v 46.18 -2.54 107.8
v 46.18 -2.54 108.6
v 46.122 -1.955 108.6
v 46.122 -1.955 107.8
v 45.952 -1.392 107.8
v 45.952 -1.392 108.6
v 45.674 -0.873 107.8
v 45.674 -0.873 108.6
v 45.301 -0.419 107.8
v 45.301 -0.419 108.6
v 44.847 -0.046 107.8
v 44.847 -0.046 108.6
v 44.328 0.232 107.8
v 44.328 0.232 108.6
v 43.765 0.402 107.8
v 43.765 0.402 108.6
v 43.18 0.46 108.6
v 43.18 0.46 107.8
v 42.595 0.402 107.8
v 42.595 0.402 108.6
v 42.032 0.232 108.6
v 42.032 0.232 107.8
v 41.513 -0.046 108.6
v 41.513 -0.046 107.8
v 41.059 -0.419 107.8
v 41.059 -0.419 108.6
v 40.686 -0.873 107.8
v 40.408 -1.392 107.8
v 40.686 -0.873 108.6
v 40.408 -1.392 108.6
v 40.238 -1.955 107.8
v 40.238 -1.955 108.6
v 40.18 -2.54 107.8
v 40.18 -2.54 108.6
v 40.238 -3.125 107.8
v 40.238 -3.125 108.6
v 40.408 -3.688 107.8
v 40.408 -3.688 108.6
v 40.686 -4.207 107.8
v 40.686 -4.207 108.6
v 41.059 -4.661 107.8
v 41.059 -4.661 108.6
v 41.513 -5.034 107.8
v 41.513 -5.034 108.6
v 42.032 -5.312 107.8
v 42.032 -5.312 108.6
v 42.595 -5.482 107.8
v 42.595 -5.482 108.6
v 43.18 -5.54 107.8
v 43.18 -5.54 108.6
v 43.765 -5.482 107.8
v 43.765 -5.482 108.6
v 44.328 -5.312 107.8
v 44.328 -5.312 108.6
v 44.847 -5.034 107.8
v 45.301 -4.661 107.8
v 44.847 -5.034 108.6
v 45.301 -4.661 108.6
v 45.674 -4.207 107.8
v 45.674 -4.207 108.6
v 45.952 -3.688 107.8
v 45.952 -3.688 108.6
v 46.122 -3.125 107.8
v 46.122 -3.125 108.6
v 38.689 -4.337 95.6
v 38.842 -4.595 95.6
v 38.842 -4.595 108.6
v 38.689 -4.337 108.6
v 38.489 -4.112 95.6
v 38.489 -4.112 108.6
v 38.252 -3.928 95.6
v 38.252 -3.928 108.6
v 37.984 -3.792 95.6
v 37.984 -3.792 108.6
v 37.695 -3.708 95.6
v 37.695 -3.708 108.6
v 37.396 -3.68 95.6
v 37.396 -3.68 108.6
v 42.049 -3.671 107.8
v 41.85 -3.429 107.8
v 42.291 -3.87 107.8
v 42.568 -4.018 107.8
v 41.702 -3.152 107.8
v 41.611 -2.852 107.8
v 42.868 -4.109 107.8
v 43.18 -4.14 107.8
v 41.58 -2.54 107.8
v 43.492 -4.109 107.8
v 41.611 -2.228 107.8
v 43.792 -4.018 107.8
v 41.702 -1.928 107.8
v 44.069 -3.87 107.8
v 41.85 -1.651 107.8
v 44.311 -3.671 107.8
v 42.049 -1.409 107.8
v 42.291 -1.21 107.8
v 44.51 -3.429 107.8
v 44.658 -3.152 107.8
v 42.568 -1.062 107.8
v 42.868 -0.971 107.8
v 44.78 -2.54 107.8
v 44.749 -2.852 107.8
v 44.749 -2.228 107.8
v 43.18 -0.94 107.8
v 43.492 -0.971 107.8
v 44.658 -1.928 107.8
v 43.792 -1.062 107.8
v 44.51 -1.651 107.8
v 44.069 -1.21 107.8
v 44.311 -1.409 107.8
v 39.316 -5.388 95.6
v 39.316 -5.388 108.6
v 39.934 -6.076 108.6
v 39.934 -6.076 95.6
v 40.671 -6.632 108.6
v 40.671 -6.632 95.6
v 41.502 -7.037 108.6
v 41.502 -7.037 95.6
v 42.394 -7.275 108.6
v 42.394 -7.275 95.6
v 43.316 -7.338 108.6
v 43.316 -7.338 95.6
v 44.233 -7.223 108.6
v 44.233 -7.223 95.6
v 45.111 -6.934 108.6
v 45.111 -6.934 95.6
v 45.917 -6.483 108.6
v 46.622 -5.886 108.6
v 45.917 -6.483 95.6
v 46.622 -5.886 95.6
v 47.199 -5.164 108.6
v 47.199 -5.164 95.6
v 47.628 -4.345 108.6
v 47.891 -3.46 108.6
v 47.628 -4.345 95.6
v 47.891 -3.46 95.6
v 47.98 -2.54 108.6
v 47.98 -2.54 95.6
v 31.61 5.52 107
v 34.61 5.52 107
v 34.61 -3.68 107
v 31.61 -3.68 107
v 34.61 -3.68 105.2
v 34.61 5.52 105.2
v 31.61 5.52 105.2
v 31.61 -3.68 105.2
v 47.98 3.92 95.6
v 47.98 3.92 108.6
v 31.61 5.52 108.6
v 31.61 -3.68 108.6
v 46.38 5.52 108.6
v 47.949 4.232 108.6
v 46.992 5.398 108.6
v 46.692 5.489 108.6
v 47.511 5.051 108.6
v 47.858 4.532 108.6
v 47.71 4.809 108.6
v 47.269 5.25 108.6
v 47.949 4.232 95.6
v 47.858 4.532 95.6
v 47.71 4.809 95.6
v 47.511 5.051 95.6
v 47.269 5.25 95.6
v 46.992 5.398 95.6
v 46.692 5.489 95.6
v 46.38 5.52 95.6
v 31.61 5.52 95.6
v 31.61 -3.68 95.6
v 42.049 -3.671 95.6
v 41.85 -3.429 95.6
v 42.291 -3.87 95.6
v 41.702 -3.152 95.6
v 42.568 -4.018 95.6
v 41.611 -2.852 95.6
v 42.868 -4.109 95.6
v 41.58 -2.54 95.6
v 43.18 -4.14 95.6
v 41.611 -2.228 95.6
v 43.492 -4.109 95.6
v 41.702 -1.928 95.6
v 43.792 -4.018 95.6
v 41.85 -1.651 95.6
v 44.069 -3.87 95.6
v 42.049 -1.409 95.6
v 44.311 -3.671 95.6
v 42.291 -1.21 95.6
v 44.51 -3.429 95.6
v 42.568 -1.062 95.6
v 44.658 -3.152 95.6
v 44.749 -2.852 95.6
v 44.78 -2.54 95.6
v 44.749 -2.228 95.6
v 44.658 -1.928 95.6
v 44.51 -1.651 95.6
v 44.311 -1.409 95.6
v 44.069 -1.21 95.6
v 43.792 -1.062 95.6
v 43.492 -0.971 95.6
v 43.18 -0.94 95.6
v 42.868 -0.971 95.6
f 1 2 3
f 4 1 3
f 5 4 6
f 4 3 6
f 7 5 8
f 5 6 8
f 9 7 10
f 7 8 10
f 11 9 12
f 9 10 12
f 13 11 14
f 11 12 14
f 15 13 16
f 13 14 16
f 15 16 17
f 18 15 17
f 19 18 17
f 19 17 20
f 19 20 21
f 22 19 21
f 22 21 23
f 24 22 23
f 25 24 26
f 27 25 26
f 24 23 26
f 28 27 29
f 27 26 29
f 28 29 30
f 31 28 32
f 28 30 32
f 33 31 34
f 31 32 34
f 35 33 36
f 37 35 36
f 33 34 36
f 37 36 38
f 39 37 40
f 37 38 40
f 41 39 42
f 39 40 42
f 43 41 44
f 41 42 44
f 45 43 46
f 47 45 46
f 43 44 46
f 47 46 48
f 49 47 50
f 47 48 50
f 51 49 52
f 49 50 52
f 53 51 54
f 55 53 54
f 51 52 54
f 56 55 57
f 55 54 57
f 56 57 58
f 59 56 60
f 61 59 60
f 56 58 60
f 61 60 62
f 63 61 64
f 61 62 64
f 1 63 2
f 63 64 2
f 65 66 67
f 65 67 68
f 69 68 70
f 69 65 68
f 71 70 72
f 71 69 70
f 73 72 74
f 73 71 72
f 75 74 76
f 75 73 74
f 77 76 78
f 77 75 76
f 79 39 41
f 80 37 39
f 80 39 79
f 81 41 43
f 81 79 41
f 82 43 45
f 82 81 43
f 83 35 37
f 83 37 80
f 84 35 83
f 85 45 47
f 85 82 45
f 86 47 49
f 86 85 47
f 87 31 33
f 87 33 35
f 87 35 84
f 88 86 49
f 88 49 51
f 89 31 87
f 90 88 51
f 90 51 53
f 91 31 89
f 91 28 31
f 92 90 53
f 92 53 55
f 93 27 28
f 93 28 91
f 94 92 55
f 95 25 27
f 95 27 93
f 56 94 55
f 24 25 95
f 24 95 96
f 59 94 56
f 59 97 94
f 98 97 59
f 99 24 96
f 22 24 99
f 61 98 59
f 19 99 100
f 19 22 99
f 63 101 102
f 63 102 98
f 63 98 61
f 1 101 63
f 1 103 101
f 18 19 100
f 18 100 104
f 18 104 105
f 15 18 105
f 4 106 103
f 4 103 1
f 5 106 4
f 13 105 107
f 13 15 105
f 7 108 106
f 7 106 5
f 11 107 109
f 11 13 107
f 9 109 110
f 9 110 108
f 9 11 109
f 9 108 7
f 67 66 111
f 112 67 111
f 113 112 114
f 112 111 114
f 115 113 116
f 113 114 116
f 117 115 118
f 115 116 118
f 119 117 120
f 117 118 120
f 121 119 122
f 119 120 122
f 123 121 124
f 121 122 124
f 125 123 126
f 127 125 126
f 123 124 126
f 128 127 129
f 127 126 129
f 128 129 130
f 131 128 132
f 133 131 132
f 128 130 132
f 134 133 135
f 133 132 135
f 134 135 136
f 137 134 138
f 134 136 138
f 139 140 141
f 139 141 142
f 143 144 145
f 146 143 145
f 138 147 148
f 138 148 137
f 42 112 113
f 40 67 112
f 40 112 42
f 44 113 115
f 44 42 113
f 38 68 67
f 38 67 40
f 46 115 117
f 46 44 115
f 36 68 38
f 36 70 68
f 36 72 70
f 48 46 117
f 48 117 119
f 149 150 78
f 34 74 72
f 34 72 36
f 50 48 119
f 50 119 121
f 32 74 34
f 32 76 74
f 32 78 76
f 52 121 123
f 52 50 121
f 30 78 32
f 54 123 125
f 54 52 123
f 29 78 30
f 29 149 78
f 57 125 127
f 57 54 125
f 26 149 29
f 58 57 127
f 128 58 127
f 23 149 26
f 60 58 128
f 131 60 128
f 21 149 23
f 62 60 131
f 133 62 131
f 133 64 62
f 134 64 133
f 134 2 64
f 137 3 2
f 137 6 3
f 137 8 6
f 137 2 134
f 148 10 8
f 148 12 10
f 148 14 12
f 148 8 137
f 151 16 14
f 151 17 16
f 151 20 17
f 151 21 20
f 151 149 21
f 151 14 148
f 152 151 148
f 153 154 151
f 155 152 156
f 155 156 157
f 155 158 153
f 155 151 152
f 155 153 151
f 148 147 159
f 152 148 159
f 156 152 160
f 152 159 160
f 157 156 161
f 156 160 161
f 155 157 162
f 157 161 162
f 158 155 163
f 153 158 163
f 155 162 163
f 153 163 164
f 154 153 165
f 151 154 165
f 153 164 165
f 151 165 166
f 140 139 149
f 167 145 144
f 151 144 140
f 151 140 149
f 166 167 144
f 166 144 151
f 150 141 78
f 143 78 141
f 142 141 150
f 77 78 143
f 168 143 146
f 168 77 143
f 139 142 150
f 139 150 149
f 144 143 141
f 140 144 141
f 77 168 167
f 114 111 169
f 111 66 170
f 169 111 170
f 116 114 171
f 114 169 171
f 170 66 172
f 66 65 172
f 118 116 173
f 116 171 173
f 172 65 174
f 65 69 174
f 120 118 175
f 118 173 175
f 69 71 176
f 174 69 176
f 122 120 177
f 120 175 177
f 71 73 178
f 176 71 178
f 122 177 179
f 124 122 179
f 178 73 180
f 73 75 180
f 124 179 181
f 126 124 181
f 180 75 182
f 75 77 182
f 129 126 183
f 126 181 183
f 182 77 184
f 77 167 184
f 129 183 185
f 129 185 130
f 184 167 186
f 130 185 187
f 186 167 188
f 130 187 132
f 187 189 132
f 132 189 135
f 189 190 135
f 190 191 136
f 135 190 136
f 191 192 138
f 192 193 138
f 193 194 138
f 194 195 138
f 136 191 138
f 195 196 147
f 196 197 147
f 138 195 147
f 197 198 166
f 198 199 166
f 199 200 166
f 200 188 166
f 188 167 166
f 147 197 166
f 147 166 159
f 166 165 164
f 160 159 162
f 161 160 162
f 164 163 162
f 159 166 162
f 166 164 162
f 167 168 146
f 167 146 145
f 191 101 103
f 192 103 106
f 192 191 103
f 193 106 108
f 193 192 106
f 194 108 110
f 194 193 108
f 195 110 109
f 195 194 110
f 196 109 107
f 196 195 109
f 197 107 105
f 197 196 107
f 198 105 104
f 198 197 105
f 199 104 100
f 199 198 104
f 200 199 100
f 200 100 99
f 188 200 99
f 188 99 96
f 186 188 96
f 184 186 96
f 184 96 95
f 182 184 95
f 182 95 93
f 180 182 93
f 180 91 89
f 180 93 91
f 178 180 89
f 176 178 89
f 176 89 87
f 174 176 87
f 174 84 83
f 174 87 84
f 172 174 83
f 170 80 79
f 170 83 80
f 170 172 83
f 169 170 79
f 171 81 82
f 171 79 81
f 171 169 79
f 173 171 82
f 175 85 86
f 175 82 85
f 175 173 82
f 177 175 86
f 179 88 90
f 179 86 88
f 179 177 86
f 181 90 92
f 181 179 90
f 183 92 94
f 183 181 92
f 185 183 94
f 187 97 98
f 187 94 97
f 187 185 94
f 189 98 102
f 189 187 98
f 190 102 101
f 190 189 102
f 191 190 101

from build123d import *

# Parameters (mm, degrees)
SKETCH028_R     = 1.6
PAD016_DEPTH    = 13
SKETCH029_W     = 3
SKETCH029_H     = 1.8
POCKET010_DEPTH = 12.861
SKETCH030_R     = 3
POCKET011_DEPTH = 0.8


with BuildPart() as part:
    # Sketch028 (on Face1 of Binder006) → Pad016 (new body)
    with BuildSketch(Plane.XY.offset(95.6)):
        with BuildLine():
            ThreePointArc((38.842146, -4.595), (44.233162, -7.223038), (47.98, -2.54))
            Line((47.98, 3.92), (47.98, -2.54))
            ThreePointArc((47.98, 3.92), (47.511371, 5.051371), (46.38, 5.52))
            Line((31.61, 5.52), (46.38, 5.52))
            Line((31.61, -3.68), (31.61, 5.52))
            Line((37.396195, -3.68), (31.61, -3.68))
            ThreePointArc((38.842146, -4.595), (38.251765, -3.927964), (37.396195, -3.68))
        make_face()
        with Locations((43.18, -2.54)):
            Circle(SKETCH028_R, mode=Mode.SUBTRACT)
    extrude(amount=PAD016_DEPTH)

    # Sketch029 (on Face4 of Pad016) → Pocket010 (cut, through all)
    with BuildSketch(Plane(origin=(0, 5.52, 0), x_dir=(-1, 0, 0), z_dir=(0, 1, 0))):
        with Locations((-33.11, 106.1)):
            Rectangle(SKETCH029_W, SKETCH029_H)
    extrude(amount=-POCKET010_DEPTH, mode=Mode.SUBTRACT)

    # Sketch030 (on Face5 of Pocket010) → Pocket011 (cut)
    with BuildSketch(Plane.XY.offset(108.6)):
        with Locations((43.18, -2.54)):
            Circle(SKETCH030_R)
    extrude(amount=-POCKET011_DEPTH, mode=Mode.SUBTRACT)


solid = part.part
